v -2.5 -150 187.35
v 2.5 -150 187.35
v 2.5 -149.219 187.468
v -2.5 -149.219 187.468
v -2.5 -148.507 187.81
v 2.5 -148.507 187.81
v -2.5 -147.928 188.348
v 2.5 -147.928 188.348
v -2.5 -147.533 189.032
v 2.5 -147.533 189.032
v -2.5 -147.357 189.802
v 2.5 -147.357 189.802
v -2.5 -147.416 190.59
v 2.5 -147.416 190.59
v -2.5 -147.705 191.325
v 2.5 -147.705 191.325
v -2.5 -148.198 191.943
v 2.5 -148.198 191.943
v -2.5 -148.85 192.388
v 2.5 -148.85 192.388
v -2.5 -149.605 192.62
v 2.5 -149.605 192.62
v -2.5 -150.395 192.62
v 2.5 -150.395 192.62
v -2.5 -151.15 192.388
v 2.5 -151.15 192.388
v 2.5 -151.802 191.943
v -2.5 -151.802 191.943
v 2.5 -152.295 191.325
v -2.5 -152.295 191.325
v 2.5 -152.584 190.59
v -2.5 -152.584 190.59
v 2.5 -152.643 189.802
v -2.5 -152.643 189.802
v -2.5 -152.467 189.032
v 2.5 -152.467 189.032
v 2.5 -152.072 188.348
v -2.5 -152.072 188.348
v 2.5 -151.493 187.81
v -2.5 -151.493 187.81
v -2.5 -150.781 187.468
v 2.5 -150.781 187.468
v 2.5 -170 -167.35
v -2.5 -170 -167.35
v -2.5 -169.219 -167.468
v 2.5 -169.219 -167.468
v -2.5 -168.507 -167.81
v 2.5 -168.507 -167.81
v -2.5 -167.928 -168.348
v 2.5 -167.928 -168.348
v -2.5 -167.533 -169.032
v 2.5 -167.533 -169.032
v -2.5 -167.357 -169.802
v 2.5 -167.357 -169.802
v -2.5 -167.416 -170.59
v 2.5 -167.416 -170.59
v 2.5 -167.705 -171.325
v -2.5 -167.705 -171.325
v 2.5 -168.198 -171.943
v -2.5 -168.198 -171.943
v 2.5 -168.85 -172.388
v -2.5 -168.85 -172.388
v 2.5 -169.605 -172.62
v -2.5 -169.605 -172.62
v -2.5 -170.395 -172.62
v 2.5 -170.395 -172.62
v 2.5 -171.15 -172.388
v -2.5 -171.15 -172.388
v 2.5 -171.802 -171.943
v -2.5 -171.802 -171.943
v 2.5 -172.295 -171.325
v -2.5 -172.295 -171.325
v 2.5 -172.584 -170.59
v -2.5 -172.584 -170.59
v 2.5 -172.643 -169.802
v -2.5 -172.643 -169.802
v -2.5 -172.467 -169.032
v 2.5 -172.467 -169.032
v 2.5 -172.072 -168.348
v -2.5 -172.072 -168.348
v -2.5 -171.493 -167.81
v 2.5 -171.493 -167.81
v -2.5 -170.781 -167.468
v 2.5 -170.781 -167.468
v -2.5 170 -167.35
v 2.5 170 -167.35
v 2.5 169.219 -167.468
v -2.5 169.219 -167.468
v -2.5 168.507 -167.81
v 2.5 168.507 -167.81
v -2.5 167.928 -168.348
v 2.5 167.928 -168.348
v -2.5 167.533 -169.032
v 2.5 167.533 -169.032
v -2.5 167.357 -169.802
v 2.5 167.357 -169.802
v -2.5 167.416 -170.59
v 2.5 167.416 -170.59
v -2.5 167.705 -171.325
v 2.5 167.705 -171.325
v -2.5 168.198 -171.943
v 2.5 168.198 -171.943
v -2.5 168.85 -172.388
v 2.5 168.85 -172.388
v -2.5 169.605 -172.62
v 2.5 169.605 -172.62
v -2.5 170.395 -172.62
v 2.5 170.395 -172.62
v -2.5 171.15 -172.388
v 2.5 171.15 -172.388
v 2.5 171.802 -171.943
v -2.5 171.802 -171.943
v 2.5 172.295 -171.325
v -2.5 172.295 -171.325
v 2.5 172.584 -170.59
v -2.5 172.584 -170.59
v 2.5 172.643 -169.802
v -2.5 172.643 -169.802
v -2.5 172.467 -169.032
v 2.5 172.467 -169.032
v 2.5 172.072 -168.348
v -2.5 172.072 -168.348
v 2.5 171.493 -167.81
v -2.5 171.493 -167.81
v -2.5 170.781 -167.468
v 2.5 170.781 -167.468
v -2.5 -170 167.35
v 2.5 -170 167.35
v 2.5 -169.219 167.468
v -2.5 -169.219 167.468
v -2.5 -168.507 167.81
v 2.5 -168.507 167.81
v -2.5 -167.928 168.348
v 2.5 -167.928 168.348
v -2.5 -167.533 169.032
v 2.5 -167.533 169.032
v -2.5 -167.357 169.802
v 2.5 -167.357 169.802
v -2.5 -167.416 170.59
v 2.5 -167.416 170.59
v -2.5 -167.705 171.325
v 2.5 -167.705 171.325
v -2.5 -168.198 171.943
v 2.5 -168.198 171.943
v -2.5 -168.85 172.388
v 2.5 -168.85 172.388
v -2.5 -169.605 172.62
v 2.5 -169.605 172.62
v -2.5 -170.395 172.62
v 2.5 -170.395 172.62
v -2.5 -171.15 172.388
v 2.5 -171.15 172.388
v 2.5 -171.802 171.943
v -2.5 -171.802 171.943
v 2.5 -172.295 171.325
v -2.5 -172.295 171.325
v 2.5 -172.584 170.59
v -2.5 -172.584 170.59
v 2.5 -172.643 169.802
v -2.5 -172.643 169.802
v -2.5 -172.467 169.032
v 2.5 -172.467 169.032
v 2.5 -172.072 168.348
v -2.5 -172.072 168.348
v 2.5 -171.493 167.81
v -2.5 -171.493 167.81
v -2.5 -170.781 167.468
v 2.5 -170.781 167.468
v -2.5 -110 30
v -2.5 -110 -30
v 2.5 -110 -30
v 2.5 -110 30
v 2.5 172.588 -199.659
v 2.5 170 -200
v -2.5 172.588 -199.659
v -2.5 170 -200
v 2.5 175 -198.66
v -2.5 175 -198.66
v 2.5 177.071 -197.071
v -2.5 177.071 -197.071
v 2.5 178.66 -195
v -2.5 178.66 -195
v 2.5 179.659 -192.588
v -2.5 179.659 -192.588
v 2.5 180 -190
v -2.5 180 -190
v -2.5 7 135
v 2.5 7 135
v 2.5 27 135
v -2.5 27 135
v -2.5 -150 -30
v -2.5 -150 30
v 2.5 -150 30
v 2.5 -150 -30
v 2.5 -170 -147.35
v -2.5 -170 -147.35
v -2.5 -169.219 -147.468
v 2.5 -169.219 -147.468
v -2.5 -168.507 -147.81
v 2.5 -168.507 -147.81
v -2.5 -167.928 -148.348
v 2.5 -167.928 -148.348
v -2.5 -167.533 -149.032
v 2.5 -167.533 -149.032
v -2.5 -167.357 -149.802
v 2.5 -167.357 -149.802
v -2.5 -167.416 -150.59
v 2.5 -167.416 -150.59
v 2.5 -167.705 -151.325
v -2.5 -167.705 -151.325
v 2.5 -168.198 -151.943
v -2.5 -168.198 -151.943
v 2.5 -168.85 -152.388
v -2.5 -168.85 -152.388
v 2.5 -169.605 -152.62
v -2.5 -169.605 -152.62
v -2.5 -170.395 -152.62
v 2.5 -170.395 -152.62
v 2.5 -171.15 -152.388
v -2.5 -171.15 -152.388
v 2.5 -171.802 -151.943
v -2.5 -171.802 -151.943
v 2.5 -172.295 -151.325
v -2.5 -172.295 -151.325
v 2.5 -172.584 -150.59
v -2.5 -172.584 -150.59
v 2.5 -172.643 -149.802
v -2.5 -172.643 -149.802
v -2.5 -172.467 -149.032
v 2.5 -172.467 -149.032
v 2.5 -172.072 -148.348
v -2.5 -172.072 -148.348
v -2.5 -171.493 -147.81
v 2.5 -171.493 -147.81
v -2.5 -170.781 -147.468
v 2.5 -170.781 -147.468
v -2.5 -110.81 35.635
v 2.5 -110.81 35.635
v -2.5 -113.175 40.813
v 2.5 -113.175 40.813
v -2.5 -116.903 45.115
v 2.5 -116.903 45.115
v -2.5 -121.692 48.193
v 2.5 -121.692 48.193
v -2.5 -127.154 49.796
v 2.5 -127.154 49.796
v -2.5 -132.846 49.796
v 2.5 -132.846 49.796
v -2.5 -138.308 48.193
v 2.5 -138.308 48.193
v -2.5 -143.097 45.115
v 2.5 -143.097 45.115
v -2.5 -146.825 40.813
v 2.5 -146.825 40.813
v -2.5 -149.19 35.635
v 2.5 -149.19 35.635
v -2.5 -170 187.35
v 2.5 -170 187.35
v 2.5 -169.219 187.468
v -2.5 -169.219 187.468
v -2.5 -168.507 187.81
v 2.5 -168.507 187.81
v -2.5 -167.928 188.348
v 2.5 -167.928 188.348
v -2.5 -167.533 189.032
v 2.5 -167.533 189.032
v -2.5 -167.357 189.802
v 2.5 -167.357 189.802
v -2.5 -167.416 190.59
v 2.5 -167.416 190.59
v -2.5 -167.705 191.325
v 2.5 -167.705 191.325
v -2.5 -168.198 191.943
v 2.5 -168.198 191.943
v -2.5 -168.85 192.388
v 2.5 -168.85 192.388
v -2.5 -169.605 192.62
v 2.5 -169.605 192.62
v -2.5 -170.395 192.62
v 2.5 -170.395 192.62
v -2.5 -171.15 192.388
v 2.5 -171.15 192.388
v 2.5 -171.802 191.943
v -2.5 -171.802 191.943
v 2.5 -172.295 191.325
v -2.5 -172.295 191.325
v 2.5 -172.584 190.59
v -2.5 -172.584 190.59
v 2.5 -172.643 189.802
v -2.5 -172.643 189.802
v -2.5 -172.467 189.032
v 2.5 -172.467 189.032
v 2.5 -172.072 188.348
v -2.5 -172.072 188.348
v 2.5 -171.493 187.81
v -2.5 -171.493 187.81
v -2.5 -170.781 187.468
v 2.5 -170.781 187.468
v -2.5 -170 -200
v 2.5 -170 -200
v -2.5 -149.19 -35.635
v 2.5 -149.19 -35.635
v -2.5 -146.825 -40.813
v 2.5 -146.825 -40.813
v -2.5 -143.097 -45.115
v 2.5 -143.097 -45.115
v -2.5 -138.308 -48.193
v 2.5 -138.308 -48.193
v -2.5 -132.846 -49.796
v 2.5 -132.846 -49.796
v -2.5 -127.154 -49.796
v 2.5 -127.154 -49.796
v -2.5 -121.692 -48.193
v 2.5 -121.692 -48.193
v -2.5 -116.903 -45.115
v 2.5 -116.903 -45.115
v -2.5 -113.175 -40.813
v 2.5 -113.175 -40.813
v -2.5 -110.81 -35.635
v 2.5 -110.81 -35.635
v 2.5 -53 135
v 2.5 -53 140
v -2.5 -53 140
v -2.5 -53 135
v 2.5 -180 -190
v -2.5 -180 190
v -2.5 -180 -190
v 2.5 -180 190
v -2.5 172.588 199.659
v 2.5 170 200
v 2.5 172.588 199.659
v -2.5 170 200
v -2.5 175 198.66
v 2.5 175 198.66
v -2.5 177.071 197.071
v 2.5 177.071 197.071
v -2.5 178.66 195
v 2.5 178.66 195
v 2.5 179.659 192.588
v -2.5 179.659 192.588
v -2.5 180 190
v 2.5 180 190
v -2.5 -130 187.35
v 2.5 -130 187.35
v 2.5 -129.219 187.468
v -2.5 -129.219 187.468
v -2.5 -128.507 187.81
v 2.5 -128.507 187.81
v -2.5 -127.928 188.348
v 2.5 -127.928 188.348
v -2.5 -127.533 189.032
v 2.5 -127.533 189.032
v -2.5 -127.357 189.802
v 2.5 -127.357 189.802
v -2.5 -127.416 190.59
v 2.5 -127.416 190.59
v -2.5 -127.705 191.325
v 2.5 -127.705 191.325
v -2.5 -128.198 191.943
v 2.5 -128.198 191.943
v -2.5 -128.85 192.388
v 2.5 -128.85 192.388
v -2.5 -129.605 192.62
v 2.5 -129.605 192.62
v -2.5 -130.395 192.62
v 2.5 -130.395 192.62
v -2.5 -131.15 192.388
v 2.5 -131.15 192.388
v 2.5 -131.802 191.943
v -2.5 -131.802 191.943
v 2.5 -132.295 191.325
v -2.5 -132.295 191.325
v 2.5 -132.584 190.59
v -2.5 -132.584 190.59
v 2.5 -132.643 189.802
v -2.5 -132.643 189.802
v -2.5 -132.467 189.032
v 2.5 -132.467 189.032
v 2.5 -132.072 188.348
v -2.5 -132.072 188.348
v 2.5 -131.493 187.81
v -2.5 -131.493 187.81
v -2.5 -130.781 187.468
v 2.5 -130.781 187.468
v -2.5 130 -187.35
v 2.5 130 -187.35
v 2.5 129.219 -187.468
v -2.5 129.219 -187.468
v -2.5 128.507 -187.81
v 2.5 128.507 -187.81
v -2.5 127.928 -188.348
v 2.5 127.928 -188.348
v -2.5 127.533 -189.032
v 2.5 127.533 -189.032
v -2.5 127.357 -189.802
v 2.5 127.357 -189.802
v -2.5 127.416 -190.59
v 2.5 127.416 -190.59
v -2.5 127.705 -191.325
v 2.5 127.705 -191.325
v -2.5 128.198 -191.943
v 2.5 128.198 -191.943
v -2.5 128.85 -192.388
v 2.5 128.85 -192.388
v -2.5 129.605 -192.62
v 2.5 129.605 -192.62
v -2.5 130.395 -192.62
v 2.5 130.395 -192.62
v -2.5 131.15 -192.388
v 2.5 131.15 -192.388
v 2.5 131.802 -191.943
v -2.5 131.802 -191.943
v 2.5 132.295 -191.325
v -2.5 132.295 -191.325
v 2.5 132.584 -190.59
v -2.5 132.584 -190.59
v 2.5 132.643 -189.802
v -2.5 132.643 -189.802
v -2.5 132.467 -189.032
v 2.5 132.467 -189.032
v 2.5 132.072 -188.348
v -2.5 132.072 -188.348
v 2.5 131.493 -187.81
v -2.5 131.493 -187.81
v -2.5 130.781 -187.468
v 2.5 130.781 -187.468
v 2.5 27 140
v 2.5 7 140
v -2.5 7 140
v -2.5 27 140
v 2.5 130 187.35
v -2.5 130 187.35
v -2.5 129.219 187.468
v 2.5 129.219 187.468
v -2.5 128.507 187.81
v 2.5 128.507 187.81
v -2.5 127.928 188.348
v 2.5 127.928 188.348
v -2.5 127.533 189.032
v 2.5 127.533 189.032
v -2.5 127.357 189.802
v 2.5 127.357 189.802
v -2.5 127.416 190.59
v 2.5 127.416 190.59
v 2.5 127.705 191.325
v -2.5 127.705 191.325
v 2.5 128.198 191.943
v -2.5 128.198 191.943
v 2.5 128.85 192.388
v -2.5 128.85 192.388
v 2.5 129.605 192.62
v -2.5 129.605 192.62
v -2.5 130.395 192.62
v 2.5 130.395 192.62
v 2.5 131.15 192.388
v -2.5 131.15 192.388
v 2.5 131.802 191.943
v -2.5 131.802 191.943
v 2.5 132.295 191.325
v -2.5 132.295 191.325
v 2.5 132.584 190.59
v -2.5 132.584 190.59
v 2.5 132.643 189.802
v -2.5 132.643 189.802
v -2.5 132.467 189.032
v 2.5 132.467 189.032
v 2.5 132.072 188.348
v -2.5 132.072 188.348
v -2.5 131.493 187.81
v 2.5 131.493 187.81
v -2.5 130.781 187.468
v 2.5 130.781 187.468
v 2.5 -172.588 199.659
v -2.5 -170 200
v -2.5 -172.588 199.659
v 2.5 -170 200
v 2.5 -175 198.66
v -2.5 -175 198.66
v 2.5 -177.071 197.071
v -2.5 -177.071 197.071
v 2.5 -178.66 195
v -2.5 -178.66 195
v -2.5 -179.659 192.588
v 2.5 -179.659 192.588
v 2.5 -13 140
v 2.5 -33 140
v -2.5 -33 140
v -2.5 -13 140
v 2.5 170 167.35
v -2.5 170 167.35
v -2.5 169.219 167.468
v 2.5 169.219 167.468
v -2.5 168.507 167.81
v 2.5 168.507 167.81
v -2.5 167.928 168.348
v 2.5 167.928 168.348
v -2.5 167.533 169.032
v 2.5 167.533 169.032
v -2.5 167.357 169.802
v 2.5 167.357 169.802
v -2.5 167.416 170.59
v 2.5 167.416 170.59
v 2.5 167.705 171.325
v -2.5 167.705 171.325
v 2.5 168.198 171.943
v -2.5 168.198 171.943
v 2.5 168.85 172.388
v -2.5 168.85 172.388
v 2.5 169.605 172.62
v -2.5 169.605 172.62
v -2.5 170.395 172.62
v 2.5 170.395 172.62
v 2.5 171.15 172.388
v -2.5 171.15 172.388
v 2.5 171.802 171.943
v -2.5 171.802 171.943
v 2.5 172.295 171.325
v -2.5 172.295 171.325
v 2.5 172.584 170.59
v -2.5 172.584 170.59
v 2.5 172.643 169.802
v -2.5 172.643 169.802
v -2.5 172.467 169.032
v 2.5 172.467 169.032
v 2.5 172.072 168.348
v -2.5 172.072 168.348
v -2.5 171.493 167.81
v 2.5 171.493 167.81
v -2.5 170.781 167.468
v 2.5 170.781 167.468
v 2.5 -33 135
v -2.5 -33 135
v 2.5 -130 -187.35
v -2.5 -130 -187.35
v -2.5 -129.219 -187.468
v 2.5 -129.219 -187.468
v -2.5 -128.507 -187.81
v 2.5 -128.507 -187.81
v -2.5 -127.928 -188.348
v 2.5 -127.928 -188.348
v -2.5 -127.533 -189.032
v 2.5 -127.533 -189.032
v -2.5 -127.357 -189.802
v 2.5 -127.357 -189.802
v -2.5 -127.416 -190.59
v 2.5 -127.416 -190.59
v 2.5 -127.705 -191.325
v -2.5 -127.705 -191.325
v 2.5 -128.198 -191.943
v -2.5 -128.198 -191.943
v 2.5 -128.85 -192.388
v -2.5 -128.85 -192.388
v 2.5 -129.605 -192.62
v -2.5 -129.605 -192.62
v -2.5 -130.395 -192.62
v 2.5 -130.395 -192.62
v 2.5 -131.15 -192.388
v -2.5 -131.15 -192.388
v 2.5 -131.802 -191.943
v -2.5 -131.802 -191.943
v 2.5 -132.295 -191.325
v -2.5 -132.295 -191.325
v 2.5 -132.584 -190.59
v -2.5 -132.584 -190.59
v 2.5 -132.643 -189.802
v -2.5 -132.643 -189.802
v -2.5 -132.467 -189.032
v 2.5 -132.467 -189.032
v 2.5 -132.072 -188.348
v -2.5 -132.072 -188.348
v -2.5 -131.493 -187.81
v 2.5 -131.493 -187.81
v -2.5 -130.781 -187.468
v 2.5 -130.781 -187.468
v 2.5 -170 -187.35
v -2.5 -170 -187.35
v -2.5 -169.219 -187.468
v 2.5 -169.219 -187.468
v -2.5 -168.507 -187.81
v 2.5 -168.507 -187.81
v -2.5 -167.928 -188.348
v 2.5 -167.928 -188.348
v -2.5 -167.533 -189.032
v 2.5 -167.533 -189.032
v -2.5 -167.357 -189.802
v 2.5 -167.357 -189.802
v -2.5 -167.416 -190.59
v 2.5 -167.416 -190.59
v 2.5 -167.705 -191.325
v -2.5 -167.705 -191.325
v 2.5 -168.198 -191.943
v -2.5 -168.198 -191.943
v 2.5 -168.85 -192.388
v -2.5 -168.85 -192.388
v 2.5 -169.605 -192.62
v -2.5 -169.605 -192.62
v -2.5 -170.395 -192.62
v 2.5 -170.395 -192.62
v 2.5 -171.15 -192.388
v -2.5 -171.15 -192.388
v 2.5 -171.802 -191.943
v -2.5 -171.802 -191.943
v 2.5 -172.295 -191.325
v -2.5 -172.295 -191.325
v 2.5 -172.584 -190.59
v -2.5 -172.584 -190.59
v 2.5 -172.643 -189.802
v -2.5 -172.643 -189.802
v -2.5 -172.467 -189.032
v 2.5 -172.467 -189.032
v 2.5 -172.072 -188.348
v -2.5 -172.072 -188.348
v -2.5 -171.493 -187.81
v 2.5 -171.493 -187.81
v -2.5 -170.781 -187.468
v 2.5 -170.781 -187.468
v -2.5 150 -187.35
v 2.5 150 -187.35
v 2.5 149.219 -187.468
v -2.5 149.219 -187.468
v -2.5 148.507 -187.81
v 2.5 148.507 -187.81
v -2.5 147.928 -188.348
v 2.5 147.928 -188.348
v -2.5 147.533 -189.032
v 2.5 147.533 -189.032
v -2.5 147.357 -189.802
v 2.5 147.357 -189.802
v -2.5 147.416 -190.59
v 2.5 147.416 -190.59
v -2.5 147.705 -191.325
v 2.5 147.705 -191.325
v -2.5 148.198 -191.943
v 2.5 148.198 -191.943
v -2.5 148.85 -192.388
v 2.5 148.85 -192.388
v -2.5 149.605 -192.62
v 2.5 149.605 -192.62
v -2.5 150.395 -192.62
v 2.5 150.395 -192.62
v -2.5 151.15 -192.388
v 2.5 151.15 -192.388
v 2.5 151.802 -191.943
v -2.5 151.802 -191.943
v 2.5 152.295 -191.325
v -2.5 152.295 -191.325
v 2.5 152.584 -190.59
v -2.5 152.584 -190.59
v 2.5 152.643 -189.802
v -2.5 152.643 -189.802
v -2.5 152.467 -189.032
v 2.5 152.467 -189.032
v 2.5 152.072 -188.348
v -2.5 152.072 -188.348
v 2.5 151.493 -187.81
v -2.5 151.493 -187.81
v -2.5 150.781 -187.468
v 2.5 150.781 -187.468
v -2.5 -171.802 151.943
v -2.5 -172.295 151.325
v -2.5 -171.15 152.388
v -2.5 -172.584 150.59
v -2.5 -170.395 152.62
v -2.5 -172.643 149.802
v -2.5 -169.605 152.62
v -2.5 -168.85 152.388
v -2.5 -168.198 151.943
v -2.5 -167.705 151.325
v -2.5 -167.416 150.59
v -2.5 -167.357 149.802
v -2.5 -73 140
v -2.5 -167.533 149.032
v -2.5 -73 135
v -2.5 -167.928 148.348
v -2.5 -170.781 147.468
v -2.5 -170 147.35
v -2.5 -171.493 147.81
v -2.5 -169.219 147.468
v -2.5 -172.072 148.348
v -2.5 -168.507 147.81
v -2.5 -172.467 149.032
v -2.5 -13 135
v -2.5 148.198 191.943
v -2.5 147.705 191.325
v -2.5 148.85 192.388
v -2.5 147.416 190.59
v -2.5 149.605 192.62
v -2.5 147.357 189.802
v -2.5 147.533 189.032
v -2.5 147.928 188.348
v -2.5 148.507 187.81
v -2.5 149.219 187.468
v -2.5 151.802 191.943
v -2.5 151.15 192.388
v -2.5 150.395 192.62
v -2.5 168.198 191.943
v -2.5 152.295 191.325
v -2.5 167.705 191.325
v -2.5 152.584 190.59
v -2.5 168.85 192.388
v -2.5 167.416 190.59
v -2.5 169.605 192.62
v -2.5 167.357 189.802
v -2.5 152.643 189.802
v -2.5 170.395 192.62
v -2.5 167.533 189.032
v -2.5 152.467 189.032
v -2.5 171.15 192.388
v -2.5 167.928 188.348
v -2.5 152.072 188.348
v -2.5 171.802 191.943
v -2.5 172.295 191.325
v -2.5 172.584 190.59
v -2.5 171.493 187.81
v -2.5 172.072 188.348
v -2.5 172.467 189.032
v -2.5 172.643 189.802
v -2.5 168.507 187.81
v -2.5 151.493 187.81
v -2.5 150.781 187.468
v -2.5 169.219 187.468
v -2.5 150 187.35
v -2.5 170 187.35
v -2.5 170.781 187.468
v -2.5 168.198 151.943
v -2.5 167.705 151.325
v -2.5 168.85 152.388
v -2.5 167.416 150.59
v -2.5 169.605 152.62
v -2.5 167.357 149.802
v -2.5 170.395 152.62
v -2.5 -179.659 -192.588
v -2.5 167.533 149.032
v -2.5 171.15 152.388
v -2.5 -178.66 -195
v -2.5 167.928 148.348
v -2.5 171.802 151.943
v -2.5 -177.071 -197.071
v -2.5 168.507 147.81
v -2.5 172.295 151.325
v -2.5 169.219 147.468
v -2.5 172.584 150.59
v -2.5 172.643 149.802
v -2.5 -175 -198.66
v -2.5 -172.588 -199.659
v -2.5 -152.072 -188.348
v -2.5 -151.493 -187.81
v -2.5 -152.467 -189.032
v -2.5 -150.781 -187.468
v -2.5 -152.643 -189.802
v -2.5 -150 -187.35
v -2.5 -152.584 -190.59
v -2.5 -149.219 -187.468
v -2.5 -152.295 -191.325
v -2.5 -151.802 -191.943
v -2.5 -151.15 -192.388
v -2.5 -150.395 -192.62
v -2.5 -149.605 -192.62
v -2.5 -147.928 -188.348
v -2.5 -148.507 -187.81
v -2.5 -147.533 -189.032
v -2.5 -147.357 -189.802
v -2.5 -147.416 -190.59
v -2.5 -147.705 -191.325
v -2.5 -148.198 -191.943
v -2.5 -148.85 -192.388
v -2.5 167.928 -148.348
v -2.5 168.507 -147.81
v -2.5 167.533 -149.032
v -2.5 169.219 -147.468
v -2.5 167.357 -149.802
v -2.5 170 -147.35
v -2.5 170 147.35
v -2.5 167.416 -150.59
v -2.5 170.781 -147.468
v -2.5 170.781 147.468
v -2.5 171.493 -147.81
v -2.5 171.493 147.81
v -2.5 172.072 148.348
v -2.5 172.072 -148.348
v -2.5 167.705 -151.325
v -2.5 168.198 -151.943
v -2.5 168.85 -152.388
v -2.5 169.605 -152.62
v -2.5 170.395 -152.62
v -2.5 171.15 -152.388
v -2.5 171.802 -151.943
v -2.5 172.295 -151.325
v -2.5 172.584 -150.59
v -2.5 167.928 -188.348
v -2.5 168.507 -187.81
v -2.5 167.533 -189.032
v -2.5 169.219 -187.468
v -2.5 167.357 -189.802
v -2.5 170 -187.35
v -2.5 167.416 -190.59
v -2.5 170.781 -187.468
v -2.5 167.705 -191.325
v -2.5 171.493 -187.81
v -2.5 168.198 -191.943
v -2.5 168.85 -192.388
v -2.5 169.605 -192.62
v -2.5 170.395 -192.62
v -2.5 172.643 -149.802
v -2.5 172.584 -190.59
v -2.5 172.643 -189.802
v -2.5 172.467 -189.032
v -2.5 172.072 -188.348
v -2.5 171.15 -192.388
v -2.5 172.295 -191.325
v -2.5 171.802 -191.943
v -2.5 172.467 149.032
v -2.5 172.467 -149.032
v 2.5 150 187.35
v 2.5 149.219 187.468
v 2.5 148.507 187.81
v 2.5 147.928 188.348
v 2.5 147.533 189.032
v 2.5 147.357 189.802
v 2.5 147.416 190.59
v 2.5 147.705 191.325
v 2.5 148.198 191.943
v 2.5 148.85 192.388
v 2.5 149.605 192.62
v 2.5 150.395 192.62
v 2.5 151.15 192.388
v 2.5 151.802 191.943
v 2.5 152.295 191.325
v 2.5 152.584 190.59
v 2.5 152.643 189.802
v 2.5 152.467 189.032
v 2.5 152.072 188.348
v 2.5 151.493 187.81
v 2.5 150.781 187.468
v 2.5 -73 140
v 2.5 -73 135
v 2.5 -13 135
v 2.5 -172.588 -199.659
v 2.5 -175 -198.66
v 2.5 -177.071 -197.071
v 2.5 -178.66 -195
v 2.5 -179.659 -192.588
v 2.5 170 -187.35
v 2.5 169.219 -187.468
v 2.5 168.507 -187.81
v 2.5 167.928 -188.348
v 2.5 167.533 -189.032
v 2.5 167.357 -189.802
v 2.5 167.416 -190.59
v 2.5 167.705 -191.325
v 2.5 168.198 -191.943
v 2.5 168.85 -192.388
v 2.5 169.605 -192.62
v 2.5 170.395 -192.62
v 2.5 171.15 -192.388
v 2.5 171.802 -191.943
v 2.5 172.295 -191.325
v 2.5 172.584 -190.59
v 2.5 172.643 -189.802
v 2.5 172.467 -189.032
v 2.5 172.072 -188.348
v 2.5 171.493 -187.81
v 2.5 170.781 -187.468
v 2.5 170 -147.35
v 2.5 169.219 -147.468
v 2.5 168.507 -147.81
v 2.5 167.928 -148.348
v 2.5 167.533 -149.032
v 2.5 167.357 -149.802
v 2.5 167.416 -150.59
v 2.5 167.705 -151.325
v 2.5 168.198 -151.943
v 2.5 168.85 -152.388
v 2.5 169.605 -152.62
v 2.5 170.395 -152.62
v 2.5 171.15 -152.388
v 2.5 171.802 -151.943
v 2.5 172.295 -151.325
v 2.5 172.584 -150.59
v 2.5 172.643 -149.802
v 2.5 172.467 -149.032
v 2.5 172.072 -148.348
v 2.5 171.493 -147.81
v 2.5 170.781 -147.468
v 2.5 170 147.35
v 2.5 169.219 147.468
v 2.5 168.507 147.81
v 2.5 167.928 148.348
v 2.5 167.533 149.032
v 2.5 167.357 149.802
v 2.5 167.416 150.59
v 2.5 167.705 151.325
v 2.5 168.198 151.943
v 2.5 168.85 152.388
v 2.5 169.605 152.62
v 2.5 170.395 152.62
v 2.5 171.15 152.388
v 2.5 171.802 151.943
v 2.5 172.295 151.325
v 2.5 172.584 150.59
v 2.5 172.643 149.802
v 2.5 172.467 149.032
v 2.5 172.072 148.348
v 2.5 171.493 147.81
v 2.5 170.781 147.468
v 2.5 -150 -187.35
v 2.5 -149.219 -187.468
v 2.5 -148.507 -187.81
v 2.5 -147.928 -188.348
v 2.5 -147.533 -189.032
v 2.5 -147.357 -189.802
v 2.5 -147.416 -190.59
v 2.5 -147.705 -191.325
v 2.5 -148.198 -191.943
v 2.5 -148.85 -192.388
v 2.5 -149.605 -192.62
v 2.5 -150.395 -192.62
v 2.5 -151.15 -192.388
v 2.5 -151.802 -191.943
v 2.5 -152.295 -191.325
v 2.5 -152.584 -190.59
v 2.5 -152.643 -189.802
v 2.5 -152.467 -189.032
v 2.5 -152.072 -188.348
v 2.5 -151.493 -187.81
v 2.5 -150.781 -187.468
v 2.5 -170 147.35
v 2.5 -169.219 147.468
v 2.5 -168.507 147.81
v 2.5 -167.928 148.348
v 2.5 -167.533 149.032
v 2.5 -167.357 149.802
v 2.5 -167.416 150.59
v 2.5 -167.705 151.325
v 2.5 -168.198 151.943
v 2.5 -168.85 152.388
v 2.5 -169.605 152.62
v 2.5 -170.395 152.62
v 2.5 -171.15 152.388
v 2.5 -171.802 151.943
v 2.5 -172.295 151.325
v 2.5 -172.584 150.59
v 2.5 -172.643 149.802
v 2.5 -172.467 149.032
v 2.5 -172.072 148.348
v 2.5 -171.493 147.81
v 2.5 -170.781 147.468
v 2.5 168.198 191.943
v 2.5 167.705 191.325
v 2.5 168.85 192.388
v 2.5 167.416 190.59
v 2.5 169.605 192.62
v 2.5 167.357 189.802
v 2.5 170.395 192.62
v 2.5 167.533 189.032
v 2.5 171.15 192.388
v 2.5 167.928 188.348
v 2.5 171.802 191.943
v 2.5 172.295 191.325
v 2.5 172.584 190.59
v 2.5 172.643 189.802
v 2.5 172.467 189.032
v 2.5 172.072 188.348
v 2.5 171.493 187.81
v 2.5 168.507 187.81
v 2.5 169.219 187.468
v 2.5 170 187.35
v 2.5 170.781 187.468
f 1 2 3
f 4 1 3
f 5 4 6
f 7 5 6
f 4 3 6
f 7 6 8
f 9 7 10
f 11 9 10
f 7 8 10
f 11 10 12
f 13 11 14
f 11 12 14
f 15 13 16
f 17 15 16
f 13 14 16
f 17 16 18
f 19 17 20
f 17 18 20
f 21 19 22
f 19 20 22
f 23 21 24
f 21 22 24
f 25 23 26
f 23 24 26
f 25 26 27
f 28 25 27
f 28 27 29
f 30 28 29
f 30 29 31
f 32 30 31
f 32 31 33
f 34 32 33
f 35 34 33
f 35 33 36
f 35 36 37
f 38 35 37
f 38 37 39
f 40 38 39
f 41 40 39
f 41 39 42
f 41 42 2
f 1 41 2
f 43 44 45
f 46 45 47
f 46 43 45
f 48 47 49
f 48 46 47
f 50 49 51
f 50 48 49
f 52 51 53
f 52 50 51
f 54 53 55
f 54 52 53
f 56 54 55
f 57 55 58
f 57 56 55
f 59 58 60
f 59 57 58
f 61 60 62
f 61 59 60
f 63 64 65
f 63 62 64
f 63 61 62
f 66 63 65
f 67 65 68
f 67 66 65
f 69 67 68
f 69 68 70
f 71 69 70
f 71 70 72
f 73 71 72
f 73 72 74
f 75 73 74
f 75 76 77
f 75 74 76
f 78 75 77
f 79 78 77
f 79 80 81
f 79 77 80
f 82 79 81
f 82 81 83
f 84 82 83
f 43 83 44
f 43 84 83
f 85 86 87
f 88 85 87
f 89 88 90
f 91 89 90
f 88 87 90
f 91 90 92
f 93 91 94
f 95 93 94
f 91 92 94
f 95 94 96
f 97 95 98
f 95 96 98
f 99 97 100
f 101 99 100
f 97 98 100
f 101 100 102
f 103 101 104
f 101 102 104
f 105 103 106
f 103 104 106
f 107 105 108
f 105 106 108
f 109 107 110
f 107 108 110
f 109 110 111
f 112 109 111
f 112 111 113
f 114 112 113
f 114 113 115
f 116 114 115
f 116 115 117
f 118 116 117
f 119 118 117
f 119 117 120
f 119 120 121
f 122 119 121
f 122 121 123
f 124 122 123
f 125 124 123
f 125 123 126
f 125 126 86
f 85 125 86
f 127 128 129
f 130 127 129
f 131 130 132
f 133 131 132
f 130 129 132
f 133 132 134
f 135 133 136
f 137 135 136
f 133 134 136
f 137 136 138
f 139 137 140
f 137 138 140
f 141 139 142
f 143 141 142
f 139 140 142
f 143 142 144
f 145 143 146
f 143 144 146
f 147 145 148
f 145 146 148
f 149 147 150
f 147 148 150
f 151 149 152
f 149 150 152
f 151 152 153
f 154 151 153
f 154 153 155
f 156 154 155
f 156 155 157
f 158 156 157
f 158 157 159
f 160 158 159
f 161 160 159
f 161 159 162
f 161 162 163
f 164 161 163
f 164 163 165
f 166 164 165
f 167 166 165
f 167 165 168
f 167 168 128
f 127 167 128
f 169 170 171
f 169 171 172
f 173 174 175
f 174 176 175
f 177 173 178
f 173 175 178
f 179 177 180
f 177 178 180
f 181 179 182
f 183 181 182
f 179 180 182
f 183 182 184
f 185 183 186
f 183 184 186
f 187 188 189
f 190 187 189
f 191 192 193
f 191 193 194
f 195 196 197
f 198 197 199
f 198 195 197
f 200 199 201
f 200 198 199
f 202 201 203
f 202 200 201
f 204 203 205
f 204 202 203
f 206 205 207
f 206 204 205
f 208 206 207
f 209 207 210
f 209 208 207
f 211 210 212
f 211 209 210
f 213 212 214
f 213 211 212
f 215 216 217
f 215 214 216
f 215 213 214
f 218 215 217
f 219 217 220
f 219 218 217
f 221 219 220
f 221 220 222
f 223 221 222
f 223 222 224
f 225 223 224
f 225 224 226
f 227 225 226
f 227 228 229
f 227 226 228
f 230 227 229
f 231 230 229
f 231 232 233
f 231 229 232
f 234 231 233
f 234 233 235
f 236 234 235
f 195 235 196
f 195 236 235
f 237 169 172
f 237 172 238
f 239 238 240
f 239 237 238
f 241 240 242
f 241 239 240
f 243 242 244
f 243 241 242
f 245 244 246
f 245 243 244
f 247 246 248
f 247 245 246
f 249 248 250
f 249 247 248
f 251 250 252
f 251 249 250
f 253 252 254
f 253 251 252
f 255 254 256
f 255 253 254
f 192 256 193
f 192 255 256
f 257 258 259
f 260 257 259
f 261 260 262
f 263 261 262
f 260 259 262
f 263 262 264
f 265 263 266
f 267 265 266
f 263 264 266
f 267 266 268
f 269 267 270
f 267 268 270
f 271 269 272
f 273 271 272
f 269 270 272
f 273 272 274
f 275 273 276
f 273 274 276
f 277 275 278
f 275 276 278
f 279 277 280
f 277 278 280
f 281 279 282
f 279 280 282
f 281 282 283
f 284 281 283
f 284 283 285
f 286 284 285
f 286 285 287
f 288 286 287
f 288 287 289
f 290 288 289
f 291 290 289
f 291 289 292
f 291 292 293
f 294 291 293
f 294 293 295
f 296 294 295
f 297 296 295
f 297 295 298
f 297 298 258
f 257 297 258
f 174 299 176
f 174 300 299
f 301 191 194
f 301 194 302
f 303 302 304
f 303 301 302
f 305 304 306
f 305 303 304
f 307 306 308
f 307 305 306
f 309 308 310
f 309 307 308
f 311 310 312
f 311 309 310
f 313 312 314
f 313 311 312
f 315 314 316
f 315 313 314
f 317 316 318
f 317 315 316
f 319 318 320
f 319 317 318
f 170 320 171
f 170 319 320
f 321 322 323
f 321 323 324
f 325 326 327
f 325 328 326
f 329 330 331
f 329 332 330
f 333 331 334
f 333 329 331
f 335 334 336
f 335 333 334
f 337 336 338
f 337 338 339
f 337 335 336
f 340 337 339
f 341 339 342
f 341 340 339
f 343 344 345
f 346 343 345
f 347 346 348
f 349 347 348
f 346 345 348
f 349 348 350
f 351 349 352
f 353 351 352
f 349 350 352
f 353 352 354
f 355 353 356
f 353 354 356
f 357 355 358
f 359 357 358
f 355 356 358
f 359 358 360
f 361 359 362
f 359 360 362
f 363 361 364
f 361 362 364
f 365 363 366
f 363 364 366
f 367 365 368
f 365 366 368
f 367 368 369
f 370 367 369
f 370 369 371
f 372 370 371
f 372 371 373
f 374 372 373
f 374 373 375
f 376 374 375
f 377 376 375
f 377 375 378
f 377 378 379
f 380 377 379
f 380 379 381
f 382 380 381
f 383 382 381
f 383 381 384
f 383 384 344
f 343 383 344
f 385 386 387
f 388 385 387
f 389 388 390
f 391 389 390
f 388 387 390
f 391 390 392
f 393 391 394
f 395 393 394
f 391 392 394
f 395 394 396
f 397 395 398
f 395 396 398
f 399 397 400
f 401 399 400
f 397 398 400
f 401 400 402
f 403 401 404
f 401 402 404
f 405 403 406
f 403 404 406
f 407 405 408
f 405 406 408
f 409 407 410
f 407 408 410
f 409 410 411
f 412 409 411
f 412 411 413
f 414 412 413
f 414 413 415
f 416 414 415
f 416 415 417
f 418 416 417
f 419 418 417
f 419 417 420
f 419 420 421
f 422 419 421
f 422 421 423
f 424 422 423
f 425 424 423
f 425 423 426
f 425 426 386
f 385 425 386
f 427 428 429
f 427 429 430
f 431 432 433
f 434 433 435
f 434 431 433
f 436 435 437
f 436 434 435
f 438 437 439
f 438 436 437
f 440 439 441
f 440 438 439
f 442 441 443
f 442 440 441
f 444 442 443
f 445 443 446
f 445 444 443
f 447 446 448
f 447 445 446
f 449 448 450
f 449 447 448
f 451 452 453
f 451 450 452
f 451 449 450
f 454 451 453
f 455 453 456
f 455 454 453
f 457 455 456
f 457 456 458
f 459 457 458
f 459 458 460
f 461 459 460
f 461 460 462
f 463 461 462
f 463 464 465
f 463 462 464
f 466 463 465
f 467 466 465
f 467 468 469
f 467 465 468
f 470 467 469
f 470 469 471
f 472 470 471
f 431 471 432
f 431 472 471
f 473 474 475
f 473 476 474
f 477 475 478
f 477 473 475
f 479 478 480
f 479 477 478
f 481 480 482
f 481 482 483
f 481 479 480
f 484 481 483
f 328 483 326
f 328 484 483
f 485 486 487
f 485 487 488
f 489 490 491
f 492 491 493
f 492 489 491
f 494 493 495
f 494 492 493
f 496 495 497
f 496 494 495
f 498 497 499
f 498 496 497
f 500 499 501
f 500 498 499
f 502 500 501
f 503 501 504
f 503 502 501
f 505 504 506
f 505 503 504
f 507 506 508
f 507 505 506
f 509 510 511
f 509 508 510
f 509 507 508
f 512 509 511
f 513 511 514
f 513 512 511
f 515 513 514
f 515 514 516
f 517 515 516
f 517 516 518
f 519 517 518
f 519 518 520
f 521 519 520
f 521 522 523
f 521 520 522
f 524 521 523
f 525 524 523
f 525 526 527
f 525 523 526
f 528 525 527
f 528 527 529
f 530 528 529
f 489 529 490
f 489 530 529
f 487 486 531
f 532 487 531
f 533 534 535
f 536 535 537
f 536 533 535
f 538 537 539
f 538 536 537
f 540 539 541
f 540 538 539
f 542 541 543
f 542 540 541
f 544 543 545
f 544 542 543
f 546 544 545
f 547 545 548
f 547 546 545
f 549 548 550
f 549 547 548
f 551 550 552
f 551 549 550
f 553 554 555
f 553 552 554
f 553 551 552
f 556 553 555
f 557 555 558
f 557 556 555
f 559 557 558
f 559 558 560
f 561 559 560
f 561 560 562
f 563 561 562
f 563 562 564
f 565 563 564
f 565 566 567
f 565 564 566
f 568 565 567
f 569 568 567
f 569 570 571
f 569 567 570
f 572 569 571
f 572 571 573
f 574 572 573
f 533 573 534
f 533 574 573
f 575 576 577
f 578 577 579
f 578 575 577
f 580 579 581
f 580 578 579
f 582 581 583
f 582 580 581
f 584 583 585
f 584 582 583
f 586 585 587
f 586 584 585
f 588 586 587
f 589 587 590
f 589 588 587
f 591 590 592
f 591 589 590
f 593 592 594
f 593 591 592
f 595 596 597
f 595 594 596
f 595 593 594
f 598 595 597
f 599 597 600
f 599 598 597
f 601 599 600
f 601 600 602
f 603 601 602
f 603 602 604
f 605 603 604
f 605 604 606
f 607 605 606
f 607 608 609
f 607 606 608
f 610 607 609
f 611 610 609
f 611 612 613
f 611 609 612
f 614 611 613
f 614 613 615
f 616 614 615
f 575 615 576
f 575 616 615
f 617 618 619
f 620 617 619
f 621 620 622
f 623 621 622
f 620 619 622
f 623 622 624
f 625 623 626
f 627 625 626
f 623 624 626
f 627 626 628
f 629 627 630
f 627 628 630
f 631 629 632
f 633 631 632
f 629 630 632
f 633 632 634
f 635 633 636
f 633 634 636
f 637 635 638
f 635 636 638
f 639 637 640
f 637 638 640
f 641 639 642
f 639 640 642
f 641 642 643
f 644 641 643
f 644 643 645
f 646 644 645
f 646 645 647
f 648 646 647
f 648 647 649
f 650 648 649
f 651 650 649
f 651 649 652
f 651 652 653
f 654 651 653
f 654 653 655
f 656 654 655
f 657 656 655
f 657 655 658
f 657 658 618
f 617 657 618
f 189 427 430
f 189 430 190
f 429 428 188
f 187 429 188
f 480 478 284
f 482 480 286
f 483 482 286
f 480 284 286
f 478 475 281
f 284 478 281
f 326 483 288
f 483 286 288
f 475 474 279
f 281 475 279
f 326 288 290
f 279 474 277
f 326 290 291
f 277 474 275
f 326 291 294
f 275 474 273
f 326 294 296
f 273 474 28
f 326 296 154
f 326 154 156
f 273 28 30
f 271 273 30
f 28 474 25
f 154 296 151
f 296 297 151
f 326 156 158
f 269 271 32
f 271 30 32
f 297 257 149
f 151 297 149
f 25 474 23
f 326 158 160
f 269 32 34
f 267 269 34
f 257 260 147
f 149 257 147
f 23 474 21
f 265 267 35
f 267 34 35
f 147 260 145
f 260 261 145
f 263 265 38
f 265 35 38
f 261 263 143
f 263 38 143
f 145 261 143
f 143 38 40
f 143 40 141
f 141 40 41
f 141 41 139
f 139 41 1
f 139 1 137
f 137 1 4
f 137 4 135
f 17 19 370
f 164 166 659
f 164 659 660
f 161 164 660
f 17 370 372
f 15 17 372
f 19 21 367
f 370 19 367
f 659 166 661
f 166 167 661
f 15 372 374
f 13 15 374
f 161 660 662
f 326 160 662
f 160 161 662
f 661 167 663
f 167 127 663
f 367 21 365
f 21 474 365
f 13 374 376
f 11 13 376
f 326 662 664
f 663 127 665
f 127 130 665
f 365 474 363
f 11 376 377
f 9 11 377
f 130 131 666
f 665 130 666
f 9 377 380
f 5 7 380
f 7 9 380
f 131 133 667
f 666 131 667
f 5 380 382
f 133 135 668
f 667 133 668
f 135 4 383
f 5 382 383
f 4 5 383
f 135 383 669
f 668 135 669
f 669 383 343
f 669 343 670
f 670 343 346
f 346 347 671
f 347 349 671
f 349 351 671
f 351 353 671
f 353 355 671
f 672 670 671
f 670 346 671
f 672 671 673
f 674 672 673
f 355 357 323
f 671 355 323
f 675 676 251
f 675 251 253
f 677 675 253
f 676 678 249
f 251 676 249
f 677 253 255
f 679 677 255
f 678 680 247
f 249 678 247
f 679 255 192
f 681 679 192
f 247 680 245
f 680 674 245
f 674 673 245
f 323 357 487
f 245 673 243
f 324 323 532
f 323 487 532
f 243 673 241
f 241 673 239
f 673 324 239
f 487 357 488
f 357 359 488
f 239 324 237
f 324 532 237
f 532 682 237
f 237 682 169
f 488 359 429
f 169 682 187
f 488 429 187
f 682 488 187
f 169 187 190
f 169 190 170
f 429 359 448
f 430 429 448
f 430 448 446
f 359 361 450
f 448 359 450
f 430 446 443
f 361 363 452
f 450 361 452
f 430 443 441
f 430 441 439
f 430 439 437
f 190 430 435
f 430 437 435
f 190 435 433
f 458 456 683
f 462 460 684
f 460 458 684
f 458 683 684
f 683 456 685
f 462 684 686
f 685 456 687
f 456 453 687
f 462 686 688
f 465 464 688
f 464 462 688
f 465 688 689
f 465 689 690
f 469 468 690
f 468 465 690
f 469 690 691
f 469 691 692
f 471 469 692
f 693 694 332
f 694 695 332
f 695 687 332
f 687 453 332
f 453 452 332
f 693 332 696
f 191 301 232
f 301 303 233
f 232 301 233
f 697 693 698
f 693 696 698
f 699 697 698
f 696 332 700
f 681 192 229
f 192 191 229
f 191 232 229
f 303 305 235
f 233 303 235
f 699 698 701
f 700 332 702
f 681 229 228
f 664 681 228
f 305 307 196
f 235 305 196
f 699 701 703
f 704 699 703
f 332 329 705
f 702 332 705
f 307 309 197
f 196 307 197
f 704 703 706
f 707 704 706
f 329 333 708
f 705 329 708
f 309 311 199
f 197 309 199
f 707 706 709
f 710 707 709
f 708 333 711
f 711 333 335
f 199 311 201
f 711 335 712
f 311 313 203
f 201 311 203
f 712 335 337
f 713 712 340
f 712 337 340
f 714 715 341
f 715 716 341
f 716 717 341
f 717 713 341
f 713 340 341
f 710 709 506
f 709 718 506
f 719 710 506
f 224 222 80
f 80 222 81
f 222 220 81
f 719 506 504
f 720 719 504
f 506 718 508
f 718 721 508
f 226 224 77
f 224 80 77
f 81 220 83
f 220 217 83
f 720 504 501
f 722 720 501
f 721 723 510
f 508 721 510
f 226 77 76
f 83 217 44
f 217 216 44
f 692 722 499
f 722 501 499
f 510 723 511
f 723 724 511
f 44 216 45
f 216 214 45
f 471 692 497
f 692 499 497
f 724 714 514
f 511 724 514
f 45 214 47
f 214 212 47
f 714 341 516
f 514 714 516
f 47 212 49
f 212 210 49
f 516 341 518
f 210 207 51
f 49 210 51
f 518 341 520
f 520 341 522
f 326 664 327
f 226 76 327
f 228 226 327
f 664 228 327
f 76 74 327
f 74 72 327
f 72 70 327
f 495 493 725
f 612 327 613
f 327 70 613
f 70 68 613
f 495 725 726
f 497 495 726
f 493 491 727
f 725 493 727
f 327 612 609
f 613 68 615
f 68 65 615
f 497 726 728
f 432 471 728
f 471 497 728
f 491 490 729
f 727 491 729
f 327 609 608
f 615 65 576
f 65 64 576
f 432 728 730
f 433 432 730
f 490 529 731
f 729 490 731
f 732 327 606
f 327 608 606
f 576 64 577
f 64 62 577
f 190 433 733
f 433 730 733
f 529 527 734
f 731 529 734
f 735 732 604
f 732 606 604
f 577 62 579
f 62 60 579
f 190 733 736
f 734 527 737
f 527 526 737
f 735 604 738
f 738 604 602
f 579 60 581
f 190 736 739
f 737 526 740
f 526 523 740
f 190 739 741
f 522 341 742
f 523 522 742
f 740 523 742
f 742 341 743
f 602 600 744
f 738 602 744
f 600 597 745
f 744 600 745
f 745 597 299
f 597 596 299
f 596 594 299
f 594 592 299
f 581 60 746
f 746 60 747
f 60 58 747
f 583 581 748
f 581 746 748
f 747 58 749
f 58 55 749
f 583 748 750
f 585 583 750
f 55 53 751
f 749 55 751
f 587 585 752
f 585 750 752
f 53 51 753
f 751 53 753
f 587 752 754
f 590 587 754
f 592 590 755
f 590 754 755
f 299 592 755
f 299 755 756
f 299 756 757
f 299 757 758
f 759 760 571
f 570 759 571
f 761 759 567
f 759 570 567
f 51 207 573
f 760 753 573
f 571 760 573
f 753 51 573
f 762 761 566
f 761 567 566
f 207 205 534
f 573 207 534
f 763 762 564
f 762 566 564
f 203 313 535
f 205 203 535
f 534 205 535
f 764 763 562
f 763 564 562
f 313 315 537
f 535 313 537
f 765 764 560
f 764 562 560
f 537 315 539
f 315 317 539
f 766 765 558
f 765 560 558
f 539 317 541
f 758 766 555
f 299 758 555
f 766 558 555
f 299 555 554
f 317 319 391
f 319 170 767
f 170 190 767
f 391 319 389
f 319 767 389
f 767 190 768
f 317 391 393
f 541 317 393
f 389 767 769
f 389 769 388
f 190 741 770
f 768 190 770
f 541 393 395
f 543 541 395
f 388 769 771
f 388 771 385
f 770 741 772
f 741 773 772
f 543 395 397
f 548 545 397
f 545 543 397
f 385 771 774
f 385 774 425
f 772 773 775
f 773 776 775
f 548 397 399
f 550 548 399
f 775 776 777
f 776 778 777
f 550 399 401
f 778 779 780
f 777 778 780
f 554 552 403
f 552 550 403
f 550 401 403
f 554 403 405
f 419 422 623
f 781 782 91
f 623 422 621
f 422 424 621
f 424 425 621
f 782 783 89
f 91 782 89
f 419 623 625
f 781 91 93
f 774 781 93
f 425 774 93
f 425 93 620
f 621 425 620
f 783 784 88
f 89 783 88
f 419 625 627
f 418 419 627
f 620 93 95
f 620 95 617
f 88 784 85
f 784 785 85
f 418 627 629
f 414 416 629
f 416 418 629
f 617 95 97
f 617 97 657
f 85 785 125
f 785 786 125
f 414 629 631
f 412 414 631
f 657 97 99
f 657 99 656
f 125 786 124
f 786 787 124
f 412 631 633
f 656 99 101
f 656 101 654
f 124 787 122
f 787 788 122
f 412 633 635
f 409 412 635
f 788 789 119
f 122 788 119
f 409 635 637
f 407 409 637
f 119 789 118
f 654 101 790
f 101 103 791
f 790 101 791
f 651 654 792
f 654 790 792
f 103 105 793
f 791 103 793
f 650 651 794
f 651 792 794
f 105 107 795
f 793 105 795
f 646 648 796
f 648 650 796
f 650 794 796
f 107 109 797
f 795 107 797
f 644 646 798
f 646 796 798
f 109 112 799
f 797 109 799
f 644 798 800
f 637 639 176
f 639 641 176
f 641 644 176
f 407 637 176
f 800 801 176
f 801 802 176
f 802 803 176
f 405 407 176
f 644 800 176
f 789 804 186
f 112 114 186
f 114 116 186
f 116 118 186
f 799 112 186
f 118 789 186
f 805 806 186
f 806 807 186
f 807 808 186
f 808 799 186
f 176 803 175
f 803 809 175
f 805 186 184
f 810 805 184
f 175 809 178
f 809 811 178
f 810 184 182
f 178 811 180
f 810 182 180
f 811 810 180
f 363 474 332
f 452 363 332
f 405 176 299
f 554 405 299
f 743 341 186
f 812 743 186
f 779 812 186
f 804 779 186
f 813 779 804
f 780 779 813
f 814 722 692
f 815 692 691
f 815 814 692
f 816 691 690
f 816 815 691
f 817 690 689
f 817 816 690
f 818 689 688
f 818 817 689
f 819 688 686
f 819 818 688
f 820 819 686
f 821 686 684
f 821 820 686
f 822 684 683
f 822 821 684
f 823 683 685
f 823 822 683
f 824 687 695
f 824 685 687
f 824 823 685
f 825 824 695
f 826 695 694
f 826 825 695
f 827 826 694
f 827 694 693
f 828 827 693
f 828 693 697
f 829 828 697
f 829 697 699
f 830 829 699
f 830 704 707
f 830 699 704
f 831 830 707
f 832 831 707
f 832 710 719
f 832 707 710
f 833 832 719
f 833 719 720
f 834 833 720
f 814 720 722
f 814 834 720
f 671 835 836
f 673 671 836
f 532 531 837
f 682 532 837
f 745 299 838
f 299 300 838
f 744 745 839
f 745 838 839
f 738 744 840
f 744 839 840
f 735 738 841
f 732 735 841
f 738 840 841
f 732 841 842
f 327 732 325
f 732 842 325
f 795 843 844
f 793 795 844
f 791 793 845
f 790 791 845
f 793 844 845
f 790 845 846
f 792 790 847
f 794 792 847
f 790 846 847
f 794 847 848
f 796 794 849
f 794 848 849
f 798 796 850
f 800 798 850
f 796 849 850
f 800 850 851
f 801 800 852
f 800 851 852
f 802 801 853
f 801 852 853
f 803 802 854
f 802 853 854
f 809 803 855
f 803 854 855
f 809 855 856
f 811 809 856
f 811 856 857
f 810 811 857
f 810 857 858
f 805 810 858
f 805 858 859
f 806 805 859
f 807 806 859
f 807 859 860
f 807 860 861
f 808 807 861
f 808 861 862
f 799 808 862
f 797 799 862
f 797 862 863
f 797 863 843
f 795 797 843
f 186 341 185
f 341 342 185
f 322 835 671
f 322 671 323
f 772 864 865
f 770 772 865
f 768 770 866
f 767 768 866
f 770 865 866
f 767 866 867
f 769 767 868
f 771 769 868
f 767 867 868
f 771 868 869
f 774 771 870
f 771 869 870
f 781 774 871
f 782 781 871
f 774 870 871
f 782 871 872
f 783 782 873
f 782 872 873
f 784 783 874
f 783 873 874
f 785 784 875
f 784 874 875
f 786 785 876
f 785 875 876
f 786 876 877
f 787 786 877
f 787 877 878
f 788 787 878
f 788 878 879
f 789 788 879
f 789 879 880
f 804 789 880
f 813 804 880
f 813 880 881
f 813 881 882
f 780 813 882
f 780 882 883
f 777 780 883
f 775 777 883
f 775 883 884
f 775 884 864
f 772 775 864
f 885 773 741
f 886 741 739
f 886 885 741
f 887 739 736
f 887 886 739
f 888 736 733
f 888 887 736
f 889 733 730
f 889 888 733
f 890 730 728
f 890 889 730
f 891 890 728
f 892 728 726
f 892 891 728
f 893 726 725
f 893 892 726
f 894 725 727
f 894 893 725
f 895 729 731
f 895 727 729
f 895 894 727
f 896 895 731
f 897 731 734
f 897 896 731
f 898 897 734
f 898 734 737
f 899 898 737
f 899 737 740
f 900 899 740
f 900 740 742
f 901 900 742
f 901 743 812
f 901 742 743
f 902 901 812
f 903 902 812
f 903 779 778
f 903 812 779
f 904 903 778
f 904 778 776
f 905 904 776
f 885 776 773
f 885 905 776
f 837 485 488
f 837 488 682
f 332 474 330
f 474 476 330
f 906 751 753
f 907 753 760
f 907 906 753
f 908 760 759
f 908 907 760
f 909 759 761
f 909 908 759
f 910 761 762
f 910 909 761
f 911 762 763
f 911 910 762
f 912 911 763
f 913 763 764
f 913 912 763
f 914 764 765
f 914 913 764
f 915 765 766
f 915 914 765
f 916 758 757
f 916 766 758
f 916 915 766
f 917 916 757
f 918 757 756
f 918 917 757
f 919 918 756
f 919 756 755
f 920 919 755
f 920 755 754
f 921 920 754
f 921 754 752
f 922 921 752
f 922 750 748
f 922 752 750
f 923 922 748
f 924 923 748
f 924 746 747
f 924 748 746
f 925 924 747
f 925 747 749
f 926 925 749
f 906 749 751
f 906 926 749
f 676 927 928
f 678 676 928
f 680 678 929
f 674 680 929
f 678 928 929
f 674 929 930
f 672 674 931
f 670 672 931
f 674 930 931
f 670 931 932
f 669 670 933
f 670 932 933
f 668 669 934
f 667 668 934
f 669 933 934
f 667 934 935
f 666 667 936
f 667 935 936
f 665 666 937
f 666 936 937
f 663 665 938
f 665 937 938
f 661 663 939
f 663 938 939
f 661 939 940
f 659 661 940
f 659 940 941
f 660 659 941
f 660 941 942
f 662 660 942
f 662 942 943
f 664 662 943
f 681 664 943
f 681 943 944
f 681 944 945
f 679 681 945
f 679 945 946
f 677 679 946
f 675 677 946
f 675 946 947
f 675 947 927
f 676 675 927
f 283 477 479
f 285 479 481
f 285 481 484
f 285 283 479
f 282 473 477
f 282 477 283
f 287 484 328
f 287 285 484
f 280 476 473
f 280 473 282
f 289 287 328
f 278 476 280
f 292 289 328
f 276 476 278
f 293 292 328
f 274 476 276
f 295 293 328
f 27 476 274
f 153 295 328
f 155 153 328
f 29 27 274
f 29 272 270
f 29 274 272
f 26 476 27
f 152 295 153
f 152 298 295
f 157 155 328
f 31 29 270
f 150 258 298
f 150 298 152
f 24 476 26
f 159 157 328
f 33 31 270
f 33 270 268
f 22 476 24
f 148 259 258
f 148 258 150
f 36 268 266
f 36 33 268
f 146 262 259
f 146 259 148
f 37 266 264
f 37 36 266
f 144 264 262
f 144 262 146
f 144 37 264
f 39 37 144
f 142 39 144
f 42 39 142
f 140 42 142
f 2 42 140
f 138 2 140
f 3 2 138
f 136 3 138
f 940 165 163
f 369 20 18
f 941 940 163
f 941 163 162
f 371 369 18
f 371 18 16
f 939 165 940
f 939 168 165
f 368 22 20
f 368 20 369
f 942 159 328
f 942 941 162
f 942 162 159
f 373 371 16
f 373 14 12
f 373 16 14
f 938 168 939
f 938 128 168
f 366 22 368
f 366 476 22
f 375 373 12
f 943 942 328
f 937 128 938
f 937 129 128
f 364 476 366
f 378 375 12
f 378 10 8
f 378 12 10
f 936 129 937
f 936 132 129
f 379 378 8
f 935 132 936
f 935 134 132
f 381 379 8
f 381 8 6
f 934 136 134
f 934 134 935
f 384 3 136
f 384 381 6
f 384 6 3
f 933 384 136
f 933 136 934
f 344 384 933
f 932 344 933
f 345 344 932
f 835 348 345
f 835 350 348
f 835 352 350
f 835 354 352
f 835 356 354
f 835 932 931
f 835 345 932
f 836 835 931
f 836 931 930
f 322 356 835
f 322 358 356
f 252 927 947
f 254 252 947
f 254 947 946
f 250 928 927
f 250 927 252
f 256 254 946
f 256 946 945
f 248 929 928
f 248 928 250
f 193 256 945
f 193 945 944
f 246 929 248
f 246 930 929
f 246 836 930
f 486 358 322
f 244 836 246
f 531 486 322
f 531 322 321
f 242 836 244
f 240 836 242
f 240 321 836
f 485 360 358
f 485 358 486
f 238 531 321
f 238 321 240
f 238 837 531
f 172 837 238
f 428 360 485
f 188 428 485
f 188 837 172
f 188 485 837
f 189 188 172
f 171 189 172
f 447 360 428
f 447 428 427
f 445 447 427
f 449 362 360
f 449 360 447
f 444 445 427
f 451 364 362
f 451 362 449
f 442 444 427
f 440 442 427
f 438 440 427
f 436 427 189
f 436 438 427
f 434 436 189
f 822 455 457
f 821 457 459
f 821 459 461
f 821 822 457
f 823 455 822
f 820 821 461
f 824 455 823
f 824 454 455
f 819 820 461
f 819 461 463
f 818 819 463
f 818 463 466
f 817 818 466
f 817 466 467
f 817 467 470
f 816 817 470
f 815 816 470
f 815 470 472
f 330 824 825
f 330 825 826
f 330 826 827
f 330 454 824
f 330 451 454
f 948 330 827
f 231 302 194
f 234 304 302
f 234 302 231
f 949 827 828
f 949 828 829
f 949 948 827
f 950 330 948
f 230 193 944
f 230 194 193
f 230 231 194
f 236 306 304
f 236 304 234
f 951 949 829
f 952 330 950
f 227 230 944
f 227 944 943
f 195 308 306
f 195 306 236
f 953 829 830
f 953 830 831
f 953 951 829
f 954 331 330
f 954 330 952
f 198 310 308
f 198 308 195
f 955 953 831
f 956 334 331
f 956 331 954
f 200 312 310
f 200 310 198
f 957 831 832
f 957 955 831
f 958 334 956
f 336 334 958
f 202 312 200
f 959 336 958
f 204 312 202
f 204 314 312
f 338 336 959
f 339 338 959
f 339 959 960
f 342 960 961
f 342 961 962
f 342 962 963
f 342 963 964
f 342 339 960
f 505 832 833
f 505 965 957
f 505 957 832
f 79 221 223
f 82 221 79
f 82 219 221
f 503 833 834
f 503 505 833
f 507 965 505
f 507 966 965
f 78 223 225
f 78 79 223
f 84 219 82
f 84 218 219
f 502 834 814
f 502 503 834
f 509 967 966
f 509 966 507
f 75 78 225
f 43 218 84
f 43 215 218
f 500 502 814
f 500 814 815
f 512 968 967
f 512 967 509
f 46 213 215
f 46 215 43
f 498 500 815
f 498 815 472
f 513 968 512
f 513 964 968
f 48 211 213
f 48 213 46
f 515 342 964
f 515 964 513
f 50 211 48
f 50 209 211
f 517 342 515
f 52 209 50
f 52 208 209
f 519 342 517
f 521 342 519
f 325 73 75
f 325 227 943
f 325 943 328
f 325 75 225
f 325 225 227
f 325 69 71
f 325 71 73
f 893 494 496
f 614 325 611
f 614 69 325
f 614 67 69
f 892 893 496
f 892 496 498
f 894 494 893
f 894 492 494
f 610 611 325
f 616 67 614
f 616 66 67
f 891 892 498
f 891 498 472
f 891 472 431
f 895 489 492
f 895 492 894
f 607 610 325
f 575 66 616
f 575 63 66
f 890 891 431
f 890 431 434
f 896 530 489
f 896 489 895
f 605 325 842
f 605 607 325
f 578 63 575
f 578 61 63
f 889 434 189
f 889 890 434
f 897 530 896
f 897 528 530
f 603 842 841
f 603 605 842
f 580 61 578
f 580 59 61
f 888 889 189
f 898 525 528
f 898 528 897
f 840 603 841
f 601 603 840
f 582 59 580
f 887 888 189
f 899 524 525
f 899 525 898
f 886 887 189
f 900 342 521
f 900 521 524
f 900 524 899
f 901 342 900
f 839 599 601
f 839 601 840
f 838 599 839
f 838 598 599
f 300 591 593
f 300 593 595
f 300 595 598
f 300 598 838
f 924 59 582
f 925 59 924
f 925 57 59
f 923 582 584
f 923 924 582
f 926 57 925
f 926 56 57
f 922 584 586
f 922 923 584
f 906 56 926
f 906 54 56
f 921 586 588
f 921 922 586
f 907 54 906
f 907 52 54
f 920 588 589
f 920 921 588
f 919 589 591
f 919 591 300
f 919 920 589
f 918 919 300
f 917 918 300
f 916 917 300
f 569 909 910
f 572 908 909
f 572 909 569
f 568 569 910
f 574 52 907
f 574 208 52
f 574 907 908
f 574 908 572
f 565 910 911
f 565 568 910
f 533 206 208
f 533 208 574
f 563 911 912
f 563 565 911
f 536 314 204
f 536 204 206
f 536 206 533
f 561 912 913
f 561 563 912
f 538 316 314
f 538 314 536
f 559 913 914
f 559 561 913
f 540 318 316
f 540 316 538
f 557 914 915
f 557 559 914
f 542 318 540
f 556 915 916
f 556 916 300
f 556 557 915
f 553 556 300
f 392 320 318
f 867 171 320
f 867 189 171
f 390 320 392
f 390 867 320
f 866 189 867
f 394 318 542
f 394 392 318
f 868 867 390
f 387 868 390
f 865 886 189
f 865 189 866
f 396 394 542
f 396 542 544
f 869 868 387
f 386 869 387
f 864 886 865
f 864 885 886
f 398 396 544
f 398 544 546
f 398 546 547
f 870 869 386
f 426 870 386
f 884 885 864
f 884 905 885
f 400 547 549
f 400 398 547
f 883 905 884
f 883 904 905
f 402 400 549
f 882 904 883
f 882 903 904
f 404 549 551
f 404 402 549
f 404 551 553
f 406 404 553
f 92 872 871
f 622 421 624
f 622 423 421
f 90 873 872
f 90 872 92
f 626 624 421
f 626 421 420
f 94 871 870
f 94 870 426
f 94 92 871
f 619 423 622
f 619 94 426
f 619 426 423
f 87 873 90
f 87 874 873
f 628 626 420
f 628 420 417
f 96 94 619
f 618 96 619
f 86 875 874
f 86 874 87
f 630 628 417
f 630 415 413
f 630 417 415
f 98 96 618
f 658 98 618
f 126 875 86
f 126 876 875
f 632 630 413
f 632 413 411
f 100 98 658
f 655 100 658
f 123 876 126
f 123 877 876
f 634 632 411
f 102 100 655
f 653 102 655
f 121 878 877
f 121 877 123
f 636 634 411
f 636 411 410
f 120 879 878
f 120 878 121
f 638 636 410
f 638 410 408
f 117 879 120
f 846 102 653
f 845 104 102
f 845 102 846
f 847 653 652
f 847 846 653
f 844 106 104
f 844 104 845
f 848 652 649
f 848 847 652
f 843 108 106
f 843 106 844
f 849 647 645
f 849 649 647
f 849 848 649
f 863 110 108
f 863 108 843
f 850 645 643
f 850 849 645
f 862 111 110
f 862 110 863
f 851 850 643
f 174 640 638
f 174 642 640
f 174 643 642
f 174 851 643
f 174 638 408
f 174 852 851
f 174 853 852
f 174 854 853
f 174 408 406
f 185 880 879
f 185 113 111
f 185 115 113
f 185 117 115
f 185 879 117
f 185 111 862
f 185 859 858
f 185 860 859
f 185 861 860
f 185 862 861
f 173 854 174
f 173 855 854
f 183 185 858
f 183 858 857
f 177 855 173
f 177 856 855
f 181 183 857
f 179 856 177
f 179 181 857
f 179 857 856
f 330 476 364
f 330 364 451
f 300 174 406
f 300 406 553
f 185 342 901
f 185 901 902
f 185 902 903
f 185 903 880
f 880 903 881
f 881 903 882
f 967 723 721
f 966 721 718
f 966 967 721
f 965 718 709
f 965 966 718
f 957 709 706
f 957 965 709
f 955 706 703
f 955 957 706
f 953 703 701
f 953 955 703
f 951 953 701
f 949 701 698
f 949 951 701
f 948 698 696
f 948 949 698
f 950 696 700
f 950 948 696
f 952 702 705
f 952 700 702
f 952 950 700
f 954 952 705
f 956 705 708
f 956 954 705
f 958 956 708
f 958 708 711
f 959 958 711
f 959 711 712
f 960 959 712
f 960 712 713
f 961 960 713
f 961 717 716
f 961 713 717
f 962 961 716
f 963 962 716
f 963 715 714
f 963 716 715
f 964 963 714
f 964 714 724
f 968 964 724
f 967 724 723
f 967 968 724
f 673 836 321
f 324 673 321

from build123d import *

# Parameters (mm, degrees)
ESBO_O1_W                 = 400
ESBO_O1_H                 = 360
RESSALTO_EXTRUS_O1_DEPTH  = 2.5
FILETE1_R                 = 10
ESBO_O2_R                 = 2.65
CORTE_EXTRUS_O1_DEPTH     = 270.118932816
ESPELHAR2_COPY_1_SKETCH_R = 2.65
ESPELHAR2_COPY_1_DEPTH    = 270.118932816
ESPELHAR2_COPY_2_SKETCH_R = 2.65
ESPELHAR2_COPY_2_DEPTH    = 270.118932816
ESBO_O3_W                 = 5
ESBO_O3_H                 = 20
CORTE_EXTRUS_O2_DEPTH     = 270.118932816
PADR_O_LINEAR1_COUNT      = 3
PADR_O_LINEAR1_PITCH      = 40
CORTE_EXTRUS_O3_DEPTH     = 270.118932816


with BuildPart() as part:
    # Esboço1 → Ressalto-extrusão1 (new, symmetric)
    with BuildSketch(Plane(origin=(0, 0, 0), x_dir=(0, 0, -1), z_dir=(1, 0, 0))):
        Rectangle(ESBO_O1_W, ESBO_O1_H)
    extrude(amount=RESSALTO_EXTRUS_O1_DEPTH, both=True)

    # Filete1
    filete1_edges = [part.edges().sort_by_distance(p)[0] for p in [
        (0, 180, -200),
        (0, -180, -200),
        (0, -180, 200),
        (0, 180, 200),
    ]]
    fillet(filete1_edges, radius=FILETE1_R)

    # Esboço2 → Corte-extrusão1 (cut, through all)
    with BuildSketch(Plane(origin=(2.5, 0, 0), x_dir=(0, 0, -1), z_dir=(1, 0, 0))):
        with Locations((-190, -170)):
            Circle(ESBO_O2_R)
        with Locations((-170, -170)):
            Circle(ESBO_O2_R)
        with Locations((-150, -170)):
            Circle(ESBO_O2_R)
        with Locations((-190, -150)):
            Circle(ESBO_O2_R)
        with Locations((-190, -130)):
            Circle(ESBO_O2_R)
    corte_extrus_o1 = extrude(amount=-CORTE_EXTRUS_O1_DEPTH, mode=Mode.SUBTRACT)

    # Espelhar1: Corte-extrusão1 across plane
    add(corte_extrus_o1.mirror(Plane.XY), mode=Mode.SUBTRACT)

    # Espelhar2 copy 1 sketch → Espelhar2 copy 1 (cut, through all)
    with BuildSketch(Plane(origin=(2.5, 0, 0), x_dir=(0, 0, 1), z_dir=(1, 0, 0))):
        with Locations((-190, -170)):
            Circle(ESPELHAR2_COPY_1_SKETCH_R)
        with Locations((-170, -170)):
            Circle(ESPELHAR2_COPY_1_SKETCH_R)
        with Locations((-150, -170)):
            Circle(ESPELHAR2_COPY_1_SKETCH_R)
        with Locations((-190, -150)):
            Circle(ESPELHAR2_COPY_1_SKETCH_R)
        with Locations((-190, -130)):
            Circle(ESPELHAR2_COPY_1_SKETCH_R)
    extrude(amount=-ESPELHAR2_COPY_1_DEPTH, mode=Mode.SUBTRACT)

    # Espelhar2 copy 2 sketch → Espelhar2 copy 2 (cut, through all)
    with BuildSketch(Plane(origin=(2.5, 0, 0), x_dir=(0, 0, -1), z_dir=(1, 0, 0))):
        with Locations((-190, 170)):
            Circle(ESPELHAR2_COPY_2_SKETCH_R)
        with Locations((-170, 170)):
            Circle(ESPELHAR2_COPY_2_SKETCH_R)
        with Locations((-150, 170)):
            Circle(ESPELHAR2_COPY_2_SKETCH_R)
        with Locations((-190, 150)):
            Circle(ESPELHAR2_COPY_2_SKETCH_R)
        with Locations((-190, 130)):
            Circle(ESPELHAR2_COPY_2_SKETCH_R)
    extrude(amount=-ESPELHAR2_COPY_2_DEPTH, mode=Mode.SUBTRACT)

    # Esboço3 → Corte-extrusão2 (cut, through all)
    with BuildSketch(Plane(origin=(2.5, 0, 0), x_dir=(0, 0, -1), z_dir=(1, 0, 0))):
        with Locations((-137.5, -63)):
            Rectangle(ESBO_O3_W, ESBO_O3_H)
    corte_extrus_o2 = extrude(amount=-CORTE_EXTRUS_O2_DEPTH, mode=Mode.SUBTRACT)

    # Padrão linear1: Corte-extrusão2 ×3
    with Locations(*[(0, i * PADR_O_LINEAR1_PITCH, 0) for i in range(1, PADR_O_LINEAR1_COUNT)]):
        add(corte_extrus_o2, mode=Mode.SUBTRACT)

    # Esboço4 → Corte-extrusão3 (cut, through all)
    with BuildSketch(Plane.ZY.offset(2.5)):
        with BuildLine():
            Line((30, -150), (-30, -150))
            ThreePointArc((-30, -150), (-50, -130), (-30, -110))
            Line((-30, -110), (30, -110))
            ThreePointArc((30, -110), (50, -130), (30, -150))
        make_face()
    extrude(amount=-CORTE_EXTRUS_O3_DEPTH, mode=Mode.SUBTRACT)


solid = part.part
